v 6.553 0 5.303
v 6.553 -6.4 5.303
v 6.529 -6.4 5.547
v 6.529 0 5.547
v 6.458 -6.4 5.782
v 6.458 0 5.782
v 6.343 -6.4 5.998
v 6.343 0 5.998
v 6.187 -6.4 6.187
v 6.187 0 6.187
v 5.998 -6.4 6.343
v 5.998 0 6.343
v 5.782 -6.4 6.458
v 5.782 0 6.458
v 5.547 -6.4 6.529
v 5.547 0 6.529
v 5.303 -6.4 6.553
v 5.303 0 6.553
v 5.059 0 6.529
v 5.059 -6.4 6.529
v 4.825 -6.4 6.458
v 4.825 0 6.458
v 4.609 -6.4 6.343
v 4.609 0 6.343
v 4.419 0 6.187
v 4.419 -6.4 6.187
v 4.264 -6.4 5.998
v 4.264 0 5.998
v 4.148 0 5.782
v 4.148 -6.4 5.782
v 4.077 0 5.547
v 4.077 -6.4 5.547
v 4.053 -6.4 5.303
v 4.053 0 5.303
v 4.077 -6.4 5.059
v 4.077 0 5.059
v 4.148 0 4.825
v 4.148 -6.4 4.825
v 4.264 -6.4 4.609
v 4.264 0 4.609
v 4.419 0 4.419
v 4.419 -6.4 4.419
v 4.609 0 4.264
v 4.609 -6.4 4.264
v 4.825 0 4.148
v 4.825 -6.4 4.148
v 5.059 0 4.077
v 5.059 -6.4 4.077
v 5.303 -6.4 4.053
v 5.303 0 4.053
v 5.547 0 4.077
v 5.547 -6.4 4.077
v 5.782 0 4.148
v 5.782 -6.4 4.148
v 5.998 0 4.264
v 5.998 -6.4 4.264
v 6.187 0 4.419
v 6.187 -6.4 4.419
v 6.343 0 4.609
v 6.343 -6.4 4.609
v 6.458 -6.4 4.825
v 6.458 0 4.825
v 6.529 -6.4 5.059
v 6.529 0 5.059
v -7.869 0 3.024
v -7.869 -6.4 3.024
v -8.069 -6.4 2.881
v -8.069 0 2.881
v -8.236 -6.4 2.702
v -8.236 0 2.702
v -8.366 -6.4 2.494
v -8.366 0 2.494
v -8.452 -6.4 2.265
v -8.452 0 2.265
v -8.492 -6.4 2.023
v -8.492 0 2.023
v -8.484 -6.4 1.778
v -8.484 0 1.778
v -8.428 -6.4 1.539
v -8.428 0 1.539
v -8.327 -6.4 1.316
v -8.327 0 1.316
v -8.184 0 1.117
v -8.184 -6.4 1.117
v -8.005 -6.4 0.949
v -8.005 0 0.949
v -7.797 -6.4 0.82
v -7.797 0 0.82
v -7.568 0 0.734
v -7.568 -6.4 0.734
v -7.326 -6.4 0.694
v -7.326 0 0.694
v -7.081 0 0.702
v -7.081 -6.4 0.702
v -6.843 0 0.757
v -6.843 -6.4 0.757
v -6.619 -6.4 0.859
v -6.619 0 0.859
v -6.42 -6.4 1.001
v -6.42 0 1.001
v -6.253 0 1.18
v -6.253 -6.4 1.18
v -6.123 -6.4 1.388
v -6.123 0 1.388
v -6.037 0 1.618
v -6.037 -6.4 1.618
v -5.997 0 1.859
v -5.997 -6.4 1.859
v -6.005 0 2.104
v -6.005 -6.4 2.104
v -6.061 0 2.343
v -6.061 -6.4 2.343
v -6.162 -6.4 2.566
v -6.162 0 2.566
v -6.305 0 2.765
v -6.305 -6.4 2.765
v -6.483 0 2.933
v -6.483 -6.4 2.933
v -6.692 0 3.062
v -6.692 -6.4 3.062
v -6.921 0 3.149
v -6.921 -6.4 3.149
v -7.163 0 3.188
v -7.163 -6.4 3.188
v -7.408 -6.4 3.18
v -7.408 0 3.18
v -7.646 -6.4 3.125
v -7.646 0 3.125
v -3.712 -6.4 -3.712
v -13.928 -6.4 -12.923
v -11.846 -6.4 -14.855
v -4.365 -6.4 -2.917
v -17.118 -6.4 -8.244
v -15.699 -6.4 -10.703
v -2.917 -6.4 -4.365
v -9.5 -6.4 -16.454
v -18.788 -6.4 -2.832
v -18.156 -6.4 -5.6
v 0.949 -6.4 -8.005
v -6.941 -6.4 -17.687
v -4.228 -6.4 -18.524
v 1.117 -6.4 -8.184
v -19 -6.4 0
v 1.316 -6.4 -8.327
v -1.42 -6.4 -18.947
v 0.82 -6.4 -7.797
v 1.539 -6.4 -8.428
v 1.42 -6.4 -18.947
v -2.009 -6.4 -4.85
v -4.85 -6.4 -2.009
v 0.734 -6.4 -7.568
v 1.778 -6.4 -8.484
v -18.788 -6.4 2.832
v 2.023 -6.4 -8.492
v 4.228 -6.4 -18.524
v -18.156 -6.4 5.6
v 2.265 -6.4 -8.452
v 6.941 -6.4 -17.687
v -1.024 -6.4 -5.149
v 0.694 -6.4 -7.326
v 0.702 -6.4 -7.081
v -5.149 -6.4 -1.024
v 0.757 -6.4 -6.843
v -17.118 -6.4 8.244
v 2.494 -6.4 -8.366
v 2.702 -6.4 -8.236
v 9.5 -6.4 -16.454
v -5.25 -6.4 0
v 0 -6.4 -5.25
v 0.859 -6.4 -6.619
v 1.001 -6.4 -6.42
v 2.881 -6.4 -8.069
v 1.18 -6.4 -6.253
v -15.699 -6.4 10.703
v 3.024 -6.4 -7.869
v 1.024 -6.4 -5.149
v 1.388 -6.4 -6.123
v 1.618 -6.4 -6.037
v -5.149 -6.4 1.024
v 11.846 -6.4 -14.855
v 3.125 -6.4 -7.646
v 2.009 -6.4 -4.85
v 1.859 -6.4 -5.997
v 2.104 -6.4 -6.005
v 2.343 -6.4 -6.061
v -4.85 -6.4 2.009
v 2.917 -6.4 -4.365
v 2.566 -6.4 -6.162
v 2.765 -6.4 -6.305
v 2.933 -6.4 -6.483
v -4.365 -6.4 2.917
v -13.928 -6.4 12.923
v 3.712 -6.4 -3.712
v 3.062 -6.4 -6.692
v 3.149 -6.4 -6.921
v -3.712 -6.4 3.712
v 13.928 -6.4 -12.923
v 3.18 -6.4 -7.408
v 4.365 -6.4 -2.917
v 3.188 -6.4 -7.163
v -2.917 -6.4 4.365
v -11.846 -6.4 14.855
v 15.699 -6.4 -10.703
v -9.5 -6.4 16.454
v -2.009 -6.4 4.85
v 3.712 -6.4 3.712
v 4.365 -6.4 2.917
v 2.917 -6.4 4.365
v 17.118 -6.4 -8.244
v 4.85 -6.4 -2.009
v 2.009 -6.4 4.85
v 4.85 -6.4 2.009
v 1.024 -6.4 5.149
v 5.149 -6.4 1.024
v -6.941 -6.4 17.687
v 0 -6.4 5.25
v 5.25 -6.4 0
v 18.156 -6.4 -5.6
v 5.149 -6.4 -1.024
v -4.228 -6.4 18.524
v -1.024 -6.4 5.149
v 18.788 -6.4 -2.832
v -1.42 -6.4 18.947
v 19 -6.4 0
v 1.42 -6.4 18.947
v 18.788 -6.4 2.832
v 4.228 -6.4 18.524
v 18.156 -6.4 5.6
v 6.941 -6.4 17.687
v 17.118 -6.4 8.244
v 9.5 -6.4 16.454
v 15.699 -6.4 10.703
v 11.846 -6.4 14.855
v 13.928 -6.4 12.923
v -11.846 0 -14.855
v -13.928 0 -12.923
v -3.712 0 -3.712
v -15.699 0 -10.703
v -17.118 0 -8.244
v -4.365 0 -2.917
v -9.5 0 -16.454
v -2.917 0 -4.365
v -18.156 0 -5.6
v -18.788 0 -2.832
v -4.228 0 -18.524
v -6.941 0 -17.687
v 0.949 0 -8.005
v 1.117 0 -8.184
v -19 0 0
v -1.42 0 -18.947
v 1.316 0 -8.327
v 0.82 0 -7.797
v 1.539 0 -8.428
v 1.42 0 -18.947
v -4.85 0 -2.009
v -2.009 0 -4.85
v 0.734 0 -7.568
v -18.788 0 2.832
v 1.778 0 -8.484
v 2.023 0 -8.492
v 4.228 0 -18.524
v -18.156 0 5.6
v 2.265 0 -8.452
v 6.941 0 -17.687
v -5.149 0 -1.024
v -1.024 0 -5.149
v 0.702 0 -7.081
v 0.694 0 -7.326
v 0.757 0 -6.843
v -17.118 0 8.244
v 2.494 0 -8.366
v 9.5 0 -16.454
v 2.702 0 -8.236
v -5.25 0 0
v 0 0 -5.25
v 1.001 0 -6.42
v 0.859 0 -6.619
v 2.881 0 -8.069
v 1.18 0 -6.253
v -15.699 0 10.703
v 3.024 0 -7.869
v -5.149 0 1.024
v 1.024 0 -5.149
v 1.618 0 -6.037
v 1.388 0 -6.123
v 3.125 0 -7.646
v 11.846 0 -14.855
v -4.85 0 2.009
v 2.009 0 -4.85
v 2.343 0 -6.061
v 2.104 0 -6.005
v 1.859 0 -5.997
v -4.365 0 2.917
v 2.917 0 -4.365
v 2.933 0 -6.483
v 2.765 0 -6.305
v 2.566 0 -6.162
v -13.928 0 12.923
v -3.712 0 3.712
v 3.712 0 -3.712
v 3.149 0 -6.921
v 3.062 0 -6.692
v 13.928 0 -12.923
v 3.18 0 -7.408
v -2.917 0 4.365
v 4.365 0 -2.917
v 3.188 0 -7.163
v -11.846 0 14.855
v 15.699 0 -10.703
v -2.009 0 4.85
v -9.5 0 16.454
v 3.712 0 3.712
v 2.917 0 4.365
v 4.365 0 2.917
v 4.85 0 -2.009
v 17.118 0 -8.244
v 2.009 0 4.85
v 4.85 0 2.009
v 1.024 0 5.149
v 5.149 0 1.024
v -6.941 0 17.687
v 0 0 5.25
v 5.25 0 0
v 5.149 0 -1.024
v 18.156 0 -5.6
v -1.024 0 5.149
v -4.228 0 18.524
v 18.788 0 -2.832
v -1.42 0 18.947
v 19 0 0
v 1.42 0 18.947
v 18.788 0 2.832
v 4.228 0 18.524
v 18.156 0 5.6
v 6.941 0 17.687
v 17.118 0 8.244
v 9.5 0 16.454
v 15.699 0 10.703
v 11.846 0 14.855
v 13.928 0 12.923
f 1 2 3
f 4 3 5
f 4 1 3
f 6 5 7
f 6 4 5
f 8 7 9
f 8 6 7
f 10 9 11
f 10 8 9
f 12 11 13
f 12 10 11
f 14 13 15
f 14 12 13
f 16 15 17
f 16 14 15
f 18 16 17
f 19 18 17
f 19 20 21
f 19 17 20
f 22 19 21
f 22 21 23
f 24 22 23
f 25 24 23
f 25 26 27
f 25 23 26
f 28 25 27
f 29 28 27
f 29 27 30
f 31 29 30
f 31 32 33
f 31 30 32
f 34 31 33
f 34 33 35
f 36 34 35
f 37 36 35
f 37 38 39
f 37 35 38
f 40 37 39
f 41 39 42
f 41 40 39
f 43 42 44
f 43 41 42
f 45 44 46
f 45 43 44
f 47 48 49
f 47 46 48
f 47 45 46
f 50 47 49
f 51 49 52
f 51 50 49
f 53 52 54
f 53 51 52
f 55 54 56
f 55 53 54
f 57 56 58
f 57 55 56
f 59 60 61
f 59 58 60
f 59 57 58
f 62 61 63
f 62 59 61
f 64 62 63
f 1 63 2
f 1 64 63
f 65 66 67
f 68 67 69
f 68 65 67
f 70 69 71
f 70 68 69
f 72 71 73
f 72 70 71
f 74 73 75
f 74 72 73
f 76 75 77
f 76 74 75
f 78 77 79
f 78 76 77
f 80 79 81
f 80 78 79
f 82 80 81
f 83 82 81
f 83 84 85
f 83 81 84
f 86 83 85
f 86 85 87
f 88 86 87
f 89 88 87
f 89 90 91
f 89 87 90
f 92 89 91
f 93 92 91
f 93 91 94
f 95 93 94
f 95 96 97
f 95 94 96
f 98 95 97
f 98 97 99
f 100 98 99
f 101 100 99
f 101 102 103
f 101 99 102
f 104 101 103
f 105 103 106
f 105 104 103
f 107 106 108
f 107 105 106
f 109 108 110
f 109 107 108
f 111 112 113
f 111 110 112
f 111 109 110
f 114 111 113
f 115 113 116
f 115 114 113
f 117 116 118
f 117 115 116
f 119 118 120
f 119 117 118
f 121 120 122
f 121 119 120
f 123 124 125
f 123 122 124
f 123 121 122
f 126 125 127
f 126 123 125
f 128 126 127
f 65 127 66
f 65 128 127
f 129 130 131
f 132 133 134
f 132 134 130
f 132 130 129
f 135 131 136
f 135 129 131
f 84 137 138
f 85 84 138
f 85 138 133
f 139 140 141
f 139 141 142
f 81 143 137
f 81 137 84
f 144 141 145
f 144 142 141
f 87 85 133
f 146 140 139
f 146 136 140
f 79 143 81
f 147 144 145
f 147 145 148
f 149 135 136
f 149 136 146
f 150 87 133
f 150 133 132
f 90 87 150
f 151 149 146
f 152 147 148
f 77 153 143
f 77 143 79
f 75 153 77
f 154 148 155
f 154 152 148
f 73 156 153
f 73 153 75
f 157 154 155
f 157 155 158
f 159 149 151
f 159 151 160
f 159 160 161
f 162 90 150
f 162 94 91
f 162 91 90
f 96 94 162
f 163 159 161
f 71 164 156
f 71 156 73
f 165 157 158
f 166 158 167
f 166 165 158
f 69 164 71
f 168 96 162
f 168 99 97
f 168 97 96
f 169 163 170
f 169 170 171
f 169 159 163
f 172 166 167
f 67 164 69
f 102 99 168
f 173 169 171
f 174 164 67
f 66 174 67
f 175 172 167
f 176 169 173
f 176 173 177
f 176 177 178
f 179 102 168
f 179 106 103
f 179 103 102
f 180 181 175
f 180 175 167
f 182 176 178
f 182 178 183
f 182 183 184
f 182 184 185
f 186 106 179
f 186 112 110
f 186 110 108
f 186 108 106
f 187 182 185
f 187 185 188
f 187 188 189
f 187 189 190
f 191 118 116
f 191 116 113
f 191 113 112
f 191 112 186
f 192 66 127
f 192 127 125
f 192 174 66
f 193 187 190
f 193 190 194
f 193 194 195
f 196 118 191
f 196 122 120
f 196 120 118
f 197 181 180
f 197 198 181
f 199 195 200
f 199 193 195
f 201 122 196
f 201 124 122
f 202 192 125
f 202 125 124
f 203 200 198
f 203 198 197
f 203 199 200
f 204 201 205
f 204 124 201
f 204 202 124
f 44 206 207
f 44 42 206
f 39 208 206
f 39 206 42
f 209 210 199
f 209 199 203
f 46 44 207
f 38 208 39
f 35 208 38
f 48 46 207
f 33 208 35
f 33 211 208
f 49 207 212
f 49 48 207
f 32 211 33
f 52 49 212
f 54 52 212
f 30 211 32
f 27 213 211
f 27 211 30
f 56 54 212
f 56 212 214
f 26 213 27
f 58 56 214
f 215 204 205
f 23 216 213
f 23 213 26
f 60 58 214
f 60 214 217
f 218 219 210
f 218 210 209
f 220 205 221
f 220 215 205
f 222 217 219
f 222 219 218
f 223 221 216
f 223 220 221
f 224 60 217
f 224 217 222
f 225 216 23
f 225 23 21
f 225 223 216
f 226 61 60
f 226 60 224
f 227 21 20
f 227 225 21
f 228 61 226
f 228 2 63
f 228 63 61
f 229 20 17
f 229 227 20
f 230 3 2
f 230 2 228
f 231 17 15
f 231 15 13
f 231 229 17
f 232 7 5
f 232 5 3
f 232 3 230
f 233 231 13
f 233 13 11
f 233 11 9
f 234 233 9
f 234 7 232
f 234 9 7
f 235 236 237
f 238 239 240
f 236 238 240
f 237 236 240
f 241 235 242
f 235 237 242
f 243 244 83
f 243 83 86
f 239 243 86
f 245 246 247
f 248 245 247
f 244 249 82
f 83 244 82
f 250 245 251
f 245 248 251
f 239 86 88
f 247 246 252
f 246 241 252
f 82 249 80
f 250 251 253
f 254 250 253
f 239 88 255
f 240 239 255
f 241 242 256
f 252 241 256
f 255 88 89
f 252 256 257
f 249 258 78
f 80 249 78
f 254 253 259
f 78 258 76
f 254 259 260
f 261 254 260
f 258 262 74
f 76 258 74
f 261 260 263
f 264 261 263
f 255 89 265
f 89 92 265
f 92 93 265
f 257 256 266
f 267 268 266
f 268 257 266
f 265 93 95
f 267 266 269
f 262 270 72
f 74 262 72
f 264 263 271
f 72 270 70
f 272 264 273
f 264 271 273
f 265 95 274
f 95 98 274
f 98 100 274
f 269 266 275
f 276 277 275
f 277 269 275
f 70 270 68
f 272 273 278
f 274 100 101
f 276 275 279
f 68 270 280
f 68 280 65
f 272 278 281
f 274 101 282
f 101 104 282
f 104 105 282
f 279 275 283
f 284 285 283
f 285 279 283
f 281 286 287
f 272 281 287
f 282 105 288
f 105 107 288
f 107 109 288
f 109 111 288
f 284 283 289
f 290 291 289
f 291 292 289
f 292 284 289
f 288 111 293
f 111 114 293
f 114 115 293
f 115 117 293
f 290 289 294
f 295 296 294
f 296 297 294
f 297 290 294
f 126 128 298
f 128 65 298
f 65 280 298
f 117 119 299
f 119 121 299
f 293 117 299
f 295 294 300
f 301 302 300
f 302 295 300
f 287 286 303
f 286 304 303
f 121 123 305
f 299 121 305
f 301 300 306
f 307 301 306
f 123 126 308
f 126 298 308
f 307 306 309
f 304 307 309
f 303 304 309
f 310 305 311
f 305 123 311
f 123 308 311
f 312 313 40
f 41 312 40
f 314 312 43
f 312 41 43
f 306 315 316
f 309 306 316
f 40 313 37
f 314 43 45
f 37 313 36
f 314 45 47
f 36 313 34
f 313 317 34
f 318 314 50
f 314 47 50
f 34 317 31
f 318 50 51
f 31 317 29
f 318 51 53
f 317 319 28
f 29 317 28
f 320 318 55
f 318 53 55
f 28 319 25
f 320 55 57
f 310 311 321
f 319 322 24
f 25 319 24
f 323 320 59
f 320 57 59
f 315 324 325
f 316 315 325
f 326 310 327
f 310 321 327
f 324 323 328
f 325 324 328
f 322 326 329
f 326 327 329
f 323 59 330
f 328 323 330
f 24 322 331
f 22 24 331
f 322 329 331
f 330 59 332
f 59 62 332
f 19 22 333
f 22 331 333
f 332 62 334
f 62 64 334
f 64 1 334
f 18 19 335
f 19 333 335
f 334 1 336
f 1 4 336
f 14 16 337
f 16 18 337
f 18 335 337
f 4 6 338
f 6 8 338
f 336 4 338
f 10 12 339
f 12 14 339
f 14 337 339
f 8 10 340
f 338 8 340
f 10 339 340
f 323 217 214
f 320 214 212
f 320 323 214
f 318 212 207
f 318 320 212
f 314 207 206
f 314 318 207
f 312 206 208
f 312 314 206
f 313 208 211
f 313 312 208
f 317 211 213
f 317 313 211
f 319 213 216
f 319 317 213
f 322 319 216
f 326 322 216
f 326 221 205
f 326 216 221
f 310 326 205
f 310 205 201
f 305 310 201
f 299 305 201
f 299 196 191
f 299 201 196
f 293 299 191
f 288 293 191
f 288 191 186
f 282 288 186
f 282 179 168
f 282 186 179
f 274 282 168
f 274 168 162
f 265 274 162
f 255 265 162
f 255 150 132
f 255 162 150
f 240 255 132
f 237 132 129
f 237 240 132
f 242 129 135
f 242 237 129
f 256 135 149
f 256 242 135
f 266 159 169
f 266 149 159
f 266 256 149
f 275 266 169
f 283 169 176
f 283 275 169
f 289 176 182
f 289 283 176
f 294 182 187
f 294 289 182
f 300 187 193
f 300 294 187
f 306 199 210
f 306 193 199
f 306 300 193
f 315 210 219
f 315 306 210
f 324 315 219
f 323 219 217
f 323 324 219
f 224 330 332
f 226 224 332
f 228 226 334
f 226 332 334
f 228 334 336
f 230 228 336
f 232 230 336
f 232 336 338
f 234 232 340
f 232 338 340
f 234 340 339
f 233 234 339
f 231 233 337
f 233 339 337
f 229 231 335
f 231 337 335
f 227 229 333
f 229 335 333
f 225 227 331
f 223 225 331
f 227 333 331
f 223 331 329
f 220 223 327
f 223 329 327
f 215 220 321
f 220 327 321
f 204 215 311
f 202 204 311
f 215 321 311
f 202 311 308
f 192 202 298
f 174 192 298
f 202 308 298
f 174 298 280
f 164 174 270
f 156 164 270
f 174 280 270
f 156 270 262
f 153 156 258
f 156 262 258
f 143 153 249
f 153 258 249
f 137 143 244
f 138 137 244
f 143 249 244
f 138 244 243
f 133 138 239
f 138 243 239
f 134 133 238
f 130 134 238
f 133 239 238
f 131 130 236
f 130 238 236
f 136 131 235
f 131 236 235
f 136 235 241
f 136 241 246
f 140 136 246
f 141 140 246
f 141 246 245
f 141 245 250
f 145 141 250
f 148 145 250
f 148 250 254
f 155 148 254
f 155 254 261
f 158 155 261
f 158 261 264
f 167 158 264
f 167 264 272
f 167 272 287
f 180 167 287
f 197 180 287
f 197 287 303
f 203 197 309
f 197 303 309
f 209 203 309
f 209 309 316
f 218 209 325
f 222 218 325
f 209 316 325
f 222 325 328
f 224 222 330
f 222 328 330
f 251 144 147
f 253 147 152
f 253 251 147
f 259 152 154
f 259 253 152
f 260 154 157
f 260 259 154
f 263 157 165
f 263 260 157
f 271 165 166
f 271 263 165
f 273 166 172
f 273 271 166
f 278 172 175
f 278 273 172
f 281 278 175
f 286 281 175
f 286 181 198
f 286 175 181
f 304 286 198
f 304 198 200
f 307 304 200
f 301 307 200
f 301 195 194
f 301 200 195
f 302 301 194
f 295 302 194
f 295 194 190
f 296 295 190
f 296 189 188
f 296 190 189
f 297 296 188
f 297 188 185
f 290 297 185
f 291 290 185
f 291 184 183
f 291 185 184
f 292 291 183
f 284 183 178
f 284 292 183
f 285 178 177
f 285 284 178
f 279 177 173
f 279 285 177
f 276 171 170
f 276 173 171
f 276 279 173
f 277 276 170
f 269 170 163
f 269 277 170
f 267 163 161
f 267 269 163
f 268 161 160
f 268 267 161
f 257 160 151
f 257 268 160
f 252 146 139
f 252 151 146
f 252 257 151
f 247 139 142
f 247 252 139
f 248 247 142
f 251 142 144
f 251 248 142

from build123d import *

# Parameters (mm, degrees)
F0_R            = 19
F1_DEPTH        = 6.4
F2_R            = 1.25
F3_DEPTH        = 25.4
F3_COPIES_COUNT = 3
F4_R            = 5.25
F5_DEPTH        = 6.401


# Not quite as in the source:
# - a pattern or mirror of a feature is missing from the dataset's text; its kind, count and spacing are read off the source's solid


with BuildPart() as f1:
    # F0 (on Front) → F1 (new body)
    with BuildSketch(Plane.XZ):
        Circle(F0_R)
    extrude(amount=F1_DEPTH)

    # F2 (on Front) → F3 (cut)
    with BuildSketch(Plane.XZ):
        with Locations((5.3033008589, 5.3033008589)):
            Circle(F2_R)
    f3 = extrude(amount=F3_DEPTH, mode=Mode.SUBTRACT)

    # F3_copies: F3 ×3 about axis
    f3_copies_axis = Axis((0, 0, 0), (0, 1, 0))
    for i in range(1, F3_COPIES_COUNT):
        add(f3.rotate(f3_copies_axis, i * 360 / F3_COPIES_COUNT), mode=Mode.SUBTRACT)

    # F4 (on Front) → F5 (cut, through all)
    with BuildSketch(Plane.XZ):
        Circle(F4_R)
    extrude(amount=F5_DEPTH, mode=Mode.SUBTRACT)


solid = f1.part
